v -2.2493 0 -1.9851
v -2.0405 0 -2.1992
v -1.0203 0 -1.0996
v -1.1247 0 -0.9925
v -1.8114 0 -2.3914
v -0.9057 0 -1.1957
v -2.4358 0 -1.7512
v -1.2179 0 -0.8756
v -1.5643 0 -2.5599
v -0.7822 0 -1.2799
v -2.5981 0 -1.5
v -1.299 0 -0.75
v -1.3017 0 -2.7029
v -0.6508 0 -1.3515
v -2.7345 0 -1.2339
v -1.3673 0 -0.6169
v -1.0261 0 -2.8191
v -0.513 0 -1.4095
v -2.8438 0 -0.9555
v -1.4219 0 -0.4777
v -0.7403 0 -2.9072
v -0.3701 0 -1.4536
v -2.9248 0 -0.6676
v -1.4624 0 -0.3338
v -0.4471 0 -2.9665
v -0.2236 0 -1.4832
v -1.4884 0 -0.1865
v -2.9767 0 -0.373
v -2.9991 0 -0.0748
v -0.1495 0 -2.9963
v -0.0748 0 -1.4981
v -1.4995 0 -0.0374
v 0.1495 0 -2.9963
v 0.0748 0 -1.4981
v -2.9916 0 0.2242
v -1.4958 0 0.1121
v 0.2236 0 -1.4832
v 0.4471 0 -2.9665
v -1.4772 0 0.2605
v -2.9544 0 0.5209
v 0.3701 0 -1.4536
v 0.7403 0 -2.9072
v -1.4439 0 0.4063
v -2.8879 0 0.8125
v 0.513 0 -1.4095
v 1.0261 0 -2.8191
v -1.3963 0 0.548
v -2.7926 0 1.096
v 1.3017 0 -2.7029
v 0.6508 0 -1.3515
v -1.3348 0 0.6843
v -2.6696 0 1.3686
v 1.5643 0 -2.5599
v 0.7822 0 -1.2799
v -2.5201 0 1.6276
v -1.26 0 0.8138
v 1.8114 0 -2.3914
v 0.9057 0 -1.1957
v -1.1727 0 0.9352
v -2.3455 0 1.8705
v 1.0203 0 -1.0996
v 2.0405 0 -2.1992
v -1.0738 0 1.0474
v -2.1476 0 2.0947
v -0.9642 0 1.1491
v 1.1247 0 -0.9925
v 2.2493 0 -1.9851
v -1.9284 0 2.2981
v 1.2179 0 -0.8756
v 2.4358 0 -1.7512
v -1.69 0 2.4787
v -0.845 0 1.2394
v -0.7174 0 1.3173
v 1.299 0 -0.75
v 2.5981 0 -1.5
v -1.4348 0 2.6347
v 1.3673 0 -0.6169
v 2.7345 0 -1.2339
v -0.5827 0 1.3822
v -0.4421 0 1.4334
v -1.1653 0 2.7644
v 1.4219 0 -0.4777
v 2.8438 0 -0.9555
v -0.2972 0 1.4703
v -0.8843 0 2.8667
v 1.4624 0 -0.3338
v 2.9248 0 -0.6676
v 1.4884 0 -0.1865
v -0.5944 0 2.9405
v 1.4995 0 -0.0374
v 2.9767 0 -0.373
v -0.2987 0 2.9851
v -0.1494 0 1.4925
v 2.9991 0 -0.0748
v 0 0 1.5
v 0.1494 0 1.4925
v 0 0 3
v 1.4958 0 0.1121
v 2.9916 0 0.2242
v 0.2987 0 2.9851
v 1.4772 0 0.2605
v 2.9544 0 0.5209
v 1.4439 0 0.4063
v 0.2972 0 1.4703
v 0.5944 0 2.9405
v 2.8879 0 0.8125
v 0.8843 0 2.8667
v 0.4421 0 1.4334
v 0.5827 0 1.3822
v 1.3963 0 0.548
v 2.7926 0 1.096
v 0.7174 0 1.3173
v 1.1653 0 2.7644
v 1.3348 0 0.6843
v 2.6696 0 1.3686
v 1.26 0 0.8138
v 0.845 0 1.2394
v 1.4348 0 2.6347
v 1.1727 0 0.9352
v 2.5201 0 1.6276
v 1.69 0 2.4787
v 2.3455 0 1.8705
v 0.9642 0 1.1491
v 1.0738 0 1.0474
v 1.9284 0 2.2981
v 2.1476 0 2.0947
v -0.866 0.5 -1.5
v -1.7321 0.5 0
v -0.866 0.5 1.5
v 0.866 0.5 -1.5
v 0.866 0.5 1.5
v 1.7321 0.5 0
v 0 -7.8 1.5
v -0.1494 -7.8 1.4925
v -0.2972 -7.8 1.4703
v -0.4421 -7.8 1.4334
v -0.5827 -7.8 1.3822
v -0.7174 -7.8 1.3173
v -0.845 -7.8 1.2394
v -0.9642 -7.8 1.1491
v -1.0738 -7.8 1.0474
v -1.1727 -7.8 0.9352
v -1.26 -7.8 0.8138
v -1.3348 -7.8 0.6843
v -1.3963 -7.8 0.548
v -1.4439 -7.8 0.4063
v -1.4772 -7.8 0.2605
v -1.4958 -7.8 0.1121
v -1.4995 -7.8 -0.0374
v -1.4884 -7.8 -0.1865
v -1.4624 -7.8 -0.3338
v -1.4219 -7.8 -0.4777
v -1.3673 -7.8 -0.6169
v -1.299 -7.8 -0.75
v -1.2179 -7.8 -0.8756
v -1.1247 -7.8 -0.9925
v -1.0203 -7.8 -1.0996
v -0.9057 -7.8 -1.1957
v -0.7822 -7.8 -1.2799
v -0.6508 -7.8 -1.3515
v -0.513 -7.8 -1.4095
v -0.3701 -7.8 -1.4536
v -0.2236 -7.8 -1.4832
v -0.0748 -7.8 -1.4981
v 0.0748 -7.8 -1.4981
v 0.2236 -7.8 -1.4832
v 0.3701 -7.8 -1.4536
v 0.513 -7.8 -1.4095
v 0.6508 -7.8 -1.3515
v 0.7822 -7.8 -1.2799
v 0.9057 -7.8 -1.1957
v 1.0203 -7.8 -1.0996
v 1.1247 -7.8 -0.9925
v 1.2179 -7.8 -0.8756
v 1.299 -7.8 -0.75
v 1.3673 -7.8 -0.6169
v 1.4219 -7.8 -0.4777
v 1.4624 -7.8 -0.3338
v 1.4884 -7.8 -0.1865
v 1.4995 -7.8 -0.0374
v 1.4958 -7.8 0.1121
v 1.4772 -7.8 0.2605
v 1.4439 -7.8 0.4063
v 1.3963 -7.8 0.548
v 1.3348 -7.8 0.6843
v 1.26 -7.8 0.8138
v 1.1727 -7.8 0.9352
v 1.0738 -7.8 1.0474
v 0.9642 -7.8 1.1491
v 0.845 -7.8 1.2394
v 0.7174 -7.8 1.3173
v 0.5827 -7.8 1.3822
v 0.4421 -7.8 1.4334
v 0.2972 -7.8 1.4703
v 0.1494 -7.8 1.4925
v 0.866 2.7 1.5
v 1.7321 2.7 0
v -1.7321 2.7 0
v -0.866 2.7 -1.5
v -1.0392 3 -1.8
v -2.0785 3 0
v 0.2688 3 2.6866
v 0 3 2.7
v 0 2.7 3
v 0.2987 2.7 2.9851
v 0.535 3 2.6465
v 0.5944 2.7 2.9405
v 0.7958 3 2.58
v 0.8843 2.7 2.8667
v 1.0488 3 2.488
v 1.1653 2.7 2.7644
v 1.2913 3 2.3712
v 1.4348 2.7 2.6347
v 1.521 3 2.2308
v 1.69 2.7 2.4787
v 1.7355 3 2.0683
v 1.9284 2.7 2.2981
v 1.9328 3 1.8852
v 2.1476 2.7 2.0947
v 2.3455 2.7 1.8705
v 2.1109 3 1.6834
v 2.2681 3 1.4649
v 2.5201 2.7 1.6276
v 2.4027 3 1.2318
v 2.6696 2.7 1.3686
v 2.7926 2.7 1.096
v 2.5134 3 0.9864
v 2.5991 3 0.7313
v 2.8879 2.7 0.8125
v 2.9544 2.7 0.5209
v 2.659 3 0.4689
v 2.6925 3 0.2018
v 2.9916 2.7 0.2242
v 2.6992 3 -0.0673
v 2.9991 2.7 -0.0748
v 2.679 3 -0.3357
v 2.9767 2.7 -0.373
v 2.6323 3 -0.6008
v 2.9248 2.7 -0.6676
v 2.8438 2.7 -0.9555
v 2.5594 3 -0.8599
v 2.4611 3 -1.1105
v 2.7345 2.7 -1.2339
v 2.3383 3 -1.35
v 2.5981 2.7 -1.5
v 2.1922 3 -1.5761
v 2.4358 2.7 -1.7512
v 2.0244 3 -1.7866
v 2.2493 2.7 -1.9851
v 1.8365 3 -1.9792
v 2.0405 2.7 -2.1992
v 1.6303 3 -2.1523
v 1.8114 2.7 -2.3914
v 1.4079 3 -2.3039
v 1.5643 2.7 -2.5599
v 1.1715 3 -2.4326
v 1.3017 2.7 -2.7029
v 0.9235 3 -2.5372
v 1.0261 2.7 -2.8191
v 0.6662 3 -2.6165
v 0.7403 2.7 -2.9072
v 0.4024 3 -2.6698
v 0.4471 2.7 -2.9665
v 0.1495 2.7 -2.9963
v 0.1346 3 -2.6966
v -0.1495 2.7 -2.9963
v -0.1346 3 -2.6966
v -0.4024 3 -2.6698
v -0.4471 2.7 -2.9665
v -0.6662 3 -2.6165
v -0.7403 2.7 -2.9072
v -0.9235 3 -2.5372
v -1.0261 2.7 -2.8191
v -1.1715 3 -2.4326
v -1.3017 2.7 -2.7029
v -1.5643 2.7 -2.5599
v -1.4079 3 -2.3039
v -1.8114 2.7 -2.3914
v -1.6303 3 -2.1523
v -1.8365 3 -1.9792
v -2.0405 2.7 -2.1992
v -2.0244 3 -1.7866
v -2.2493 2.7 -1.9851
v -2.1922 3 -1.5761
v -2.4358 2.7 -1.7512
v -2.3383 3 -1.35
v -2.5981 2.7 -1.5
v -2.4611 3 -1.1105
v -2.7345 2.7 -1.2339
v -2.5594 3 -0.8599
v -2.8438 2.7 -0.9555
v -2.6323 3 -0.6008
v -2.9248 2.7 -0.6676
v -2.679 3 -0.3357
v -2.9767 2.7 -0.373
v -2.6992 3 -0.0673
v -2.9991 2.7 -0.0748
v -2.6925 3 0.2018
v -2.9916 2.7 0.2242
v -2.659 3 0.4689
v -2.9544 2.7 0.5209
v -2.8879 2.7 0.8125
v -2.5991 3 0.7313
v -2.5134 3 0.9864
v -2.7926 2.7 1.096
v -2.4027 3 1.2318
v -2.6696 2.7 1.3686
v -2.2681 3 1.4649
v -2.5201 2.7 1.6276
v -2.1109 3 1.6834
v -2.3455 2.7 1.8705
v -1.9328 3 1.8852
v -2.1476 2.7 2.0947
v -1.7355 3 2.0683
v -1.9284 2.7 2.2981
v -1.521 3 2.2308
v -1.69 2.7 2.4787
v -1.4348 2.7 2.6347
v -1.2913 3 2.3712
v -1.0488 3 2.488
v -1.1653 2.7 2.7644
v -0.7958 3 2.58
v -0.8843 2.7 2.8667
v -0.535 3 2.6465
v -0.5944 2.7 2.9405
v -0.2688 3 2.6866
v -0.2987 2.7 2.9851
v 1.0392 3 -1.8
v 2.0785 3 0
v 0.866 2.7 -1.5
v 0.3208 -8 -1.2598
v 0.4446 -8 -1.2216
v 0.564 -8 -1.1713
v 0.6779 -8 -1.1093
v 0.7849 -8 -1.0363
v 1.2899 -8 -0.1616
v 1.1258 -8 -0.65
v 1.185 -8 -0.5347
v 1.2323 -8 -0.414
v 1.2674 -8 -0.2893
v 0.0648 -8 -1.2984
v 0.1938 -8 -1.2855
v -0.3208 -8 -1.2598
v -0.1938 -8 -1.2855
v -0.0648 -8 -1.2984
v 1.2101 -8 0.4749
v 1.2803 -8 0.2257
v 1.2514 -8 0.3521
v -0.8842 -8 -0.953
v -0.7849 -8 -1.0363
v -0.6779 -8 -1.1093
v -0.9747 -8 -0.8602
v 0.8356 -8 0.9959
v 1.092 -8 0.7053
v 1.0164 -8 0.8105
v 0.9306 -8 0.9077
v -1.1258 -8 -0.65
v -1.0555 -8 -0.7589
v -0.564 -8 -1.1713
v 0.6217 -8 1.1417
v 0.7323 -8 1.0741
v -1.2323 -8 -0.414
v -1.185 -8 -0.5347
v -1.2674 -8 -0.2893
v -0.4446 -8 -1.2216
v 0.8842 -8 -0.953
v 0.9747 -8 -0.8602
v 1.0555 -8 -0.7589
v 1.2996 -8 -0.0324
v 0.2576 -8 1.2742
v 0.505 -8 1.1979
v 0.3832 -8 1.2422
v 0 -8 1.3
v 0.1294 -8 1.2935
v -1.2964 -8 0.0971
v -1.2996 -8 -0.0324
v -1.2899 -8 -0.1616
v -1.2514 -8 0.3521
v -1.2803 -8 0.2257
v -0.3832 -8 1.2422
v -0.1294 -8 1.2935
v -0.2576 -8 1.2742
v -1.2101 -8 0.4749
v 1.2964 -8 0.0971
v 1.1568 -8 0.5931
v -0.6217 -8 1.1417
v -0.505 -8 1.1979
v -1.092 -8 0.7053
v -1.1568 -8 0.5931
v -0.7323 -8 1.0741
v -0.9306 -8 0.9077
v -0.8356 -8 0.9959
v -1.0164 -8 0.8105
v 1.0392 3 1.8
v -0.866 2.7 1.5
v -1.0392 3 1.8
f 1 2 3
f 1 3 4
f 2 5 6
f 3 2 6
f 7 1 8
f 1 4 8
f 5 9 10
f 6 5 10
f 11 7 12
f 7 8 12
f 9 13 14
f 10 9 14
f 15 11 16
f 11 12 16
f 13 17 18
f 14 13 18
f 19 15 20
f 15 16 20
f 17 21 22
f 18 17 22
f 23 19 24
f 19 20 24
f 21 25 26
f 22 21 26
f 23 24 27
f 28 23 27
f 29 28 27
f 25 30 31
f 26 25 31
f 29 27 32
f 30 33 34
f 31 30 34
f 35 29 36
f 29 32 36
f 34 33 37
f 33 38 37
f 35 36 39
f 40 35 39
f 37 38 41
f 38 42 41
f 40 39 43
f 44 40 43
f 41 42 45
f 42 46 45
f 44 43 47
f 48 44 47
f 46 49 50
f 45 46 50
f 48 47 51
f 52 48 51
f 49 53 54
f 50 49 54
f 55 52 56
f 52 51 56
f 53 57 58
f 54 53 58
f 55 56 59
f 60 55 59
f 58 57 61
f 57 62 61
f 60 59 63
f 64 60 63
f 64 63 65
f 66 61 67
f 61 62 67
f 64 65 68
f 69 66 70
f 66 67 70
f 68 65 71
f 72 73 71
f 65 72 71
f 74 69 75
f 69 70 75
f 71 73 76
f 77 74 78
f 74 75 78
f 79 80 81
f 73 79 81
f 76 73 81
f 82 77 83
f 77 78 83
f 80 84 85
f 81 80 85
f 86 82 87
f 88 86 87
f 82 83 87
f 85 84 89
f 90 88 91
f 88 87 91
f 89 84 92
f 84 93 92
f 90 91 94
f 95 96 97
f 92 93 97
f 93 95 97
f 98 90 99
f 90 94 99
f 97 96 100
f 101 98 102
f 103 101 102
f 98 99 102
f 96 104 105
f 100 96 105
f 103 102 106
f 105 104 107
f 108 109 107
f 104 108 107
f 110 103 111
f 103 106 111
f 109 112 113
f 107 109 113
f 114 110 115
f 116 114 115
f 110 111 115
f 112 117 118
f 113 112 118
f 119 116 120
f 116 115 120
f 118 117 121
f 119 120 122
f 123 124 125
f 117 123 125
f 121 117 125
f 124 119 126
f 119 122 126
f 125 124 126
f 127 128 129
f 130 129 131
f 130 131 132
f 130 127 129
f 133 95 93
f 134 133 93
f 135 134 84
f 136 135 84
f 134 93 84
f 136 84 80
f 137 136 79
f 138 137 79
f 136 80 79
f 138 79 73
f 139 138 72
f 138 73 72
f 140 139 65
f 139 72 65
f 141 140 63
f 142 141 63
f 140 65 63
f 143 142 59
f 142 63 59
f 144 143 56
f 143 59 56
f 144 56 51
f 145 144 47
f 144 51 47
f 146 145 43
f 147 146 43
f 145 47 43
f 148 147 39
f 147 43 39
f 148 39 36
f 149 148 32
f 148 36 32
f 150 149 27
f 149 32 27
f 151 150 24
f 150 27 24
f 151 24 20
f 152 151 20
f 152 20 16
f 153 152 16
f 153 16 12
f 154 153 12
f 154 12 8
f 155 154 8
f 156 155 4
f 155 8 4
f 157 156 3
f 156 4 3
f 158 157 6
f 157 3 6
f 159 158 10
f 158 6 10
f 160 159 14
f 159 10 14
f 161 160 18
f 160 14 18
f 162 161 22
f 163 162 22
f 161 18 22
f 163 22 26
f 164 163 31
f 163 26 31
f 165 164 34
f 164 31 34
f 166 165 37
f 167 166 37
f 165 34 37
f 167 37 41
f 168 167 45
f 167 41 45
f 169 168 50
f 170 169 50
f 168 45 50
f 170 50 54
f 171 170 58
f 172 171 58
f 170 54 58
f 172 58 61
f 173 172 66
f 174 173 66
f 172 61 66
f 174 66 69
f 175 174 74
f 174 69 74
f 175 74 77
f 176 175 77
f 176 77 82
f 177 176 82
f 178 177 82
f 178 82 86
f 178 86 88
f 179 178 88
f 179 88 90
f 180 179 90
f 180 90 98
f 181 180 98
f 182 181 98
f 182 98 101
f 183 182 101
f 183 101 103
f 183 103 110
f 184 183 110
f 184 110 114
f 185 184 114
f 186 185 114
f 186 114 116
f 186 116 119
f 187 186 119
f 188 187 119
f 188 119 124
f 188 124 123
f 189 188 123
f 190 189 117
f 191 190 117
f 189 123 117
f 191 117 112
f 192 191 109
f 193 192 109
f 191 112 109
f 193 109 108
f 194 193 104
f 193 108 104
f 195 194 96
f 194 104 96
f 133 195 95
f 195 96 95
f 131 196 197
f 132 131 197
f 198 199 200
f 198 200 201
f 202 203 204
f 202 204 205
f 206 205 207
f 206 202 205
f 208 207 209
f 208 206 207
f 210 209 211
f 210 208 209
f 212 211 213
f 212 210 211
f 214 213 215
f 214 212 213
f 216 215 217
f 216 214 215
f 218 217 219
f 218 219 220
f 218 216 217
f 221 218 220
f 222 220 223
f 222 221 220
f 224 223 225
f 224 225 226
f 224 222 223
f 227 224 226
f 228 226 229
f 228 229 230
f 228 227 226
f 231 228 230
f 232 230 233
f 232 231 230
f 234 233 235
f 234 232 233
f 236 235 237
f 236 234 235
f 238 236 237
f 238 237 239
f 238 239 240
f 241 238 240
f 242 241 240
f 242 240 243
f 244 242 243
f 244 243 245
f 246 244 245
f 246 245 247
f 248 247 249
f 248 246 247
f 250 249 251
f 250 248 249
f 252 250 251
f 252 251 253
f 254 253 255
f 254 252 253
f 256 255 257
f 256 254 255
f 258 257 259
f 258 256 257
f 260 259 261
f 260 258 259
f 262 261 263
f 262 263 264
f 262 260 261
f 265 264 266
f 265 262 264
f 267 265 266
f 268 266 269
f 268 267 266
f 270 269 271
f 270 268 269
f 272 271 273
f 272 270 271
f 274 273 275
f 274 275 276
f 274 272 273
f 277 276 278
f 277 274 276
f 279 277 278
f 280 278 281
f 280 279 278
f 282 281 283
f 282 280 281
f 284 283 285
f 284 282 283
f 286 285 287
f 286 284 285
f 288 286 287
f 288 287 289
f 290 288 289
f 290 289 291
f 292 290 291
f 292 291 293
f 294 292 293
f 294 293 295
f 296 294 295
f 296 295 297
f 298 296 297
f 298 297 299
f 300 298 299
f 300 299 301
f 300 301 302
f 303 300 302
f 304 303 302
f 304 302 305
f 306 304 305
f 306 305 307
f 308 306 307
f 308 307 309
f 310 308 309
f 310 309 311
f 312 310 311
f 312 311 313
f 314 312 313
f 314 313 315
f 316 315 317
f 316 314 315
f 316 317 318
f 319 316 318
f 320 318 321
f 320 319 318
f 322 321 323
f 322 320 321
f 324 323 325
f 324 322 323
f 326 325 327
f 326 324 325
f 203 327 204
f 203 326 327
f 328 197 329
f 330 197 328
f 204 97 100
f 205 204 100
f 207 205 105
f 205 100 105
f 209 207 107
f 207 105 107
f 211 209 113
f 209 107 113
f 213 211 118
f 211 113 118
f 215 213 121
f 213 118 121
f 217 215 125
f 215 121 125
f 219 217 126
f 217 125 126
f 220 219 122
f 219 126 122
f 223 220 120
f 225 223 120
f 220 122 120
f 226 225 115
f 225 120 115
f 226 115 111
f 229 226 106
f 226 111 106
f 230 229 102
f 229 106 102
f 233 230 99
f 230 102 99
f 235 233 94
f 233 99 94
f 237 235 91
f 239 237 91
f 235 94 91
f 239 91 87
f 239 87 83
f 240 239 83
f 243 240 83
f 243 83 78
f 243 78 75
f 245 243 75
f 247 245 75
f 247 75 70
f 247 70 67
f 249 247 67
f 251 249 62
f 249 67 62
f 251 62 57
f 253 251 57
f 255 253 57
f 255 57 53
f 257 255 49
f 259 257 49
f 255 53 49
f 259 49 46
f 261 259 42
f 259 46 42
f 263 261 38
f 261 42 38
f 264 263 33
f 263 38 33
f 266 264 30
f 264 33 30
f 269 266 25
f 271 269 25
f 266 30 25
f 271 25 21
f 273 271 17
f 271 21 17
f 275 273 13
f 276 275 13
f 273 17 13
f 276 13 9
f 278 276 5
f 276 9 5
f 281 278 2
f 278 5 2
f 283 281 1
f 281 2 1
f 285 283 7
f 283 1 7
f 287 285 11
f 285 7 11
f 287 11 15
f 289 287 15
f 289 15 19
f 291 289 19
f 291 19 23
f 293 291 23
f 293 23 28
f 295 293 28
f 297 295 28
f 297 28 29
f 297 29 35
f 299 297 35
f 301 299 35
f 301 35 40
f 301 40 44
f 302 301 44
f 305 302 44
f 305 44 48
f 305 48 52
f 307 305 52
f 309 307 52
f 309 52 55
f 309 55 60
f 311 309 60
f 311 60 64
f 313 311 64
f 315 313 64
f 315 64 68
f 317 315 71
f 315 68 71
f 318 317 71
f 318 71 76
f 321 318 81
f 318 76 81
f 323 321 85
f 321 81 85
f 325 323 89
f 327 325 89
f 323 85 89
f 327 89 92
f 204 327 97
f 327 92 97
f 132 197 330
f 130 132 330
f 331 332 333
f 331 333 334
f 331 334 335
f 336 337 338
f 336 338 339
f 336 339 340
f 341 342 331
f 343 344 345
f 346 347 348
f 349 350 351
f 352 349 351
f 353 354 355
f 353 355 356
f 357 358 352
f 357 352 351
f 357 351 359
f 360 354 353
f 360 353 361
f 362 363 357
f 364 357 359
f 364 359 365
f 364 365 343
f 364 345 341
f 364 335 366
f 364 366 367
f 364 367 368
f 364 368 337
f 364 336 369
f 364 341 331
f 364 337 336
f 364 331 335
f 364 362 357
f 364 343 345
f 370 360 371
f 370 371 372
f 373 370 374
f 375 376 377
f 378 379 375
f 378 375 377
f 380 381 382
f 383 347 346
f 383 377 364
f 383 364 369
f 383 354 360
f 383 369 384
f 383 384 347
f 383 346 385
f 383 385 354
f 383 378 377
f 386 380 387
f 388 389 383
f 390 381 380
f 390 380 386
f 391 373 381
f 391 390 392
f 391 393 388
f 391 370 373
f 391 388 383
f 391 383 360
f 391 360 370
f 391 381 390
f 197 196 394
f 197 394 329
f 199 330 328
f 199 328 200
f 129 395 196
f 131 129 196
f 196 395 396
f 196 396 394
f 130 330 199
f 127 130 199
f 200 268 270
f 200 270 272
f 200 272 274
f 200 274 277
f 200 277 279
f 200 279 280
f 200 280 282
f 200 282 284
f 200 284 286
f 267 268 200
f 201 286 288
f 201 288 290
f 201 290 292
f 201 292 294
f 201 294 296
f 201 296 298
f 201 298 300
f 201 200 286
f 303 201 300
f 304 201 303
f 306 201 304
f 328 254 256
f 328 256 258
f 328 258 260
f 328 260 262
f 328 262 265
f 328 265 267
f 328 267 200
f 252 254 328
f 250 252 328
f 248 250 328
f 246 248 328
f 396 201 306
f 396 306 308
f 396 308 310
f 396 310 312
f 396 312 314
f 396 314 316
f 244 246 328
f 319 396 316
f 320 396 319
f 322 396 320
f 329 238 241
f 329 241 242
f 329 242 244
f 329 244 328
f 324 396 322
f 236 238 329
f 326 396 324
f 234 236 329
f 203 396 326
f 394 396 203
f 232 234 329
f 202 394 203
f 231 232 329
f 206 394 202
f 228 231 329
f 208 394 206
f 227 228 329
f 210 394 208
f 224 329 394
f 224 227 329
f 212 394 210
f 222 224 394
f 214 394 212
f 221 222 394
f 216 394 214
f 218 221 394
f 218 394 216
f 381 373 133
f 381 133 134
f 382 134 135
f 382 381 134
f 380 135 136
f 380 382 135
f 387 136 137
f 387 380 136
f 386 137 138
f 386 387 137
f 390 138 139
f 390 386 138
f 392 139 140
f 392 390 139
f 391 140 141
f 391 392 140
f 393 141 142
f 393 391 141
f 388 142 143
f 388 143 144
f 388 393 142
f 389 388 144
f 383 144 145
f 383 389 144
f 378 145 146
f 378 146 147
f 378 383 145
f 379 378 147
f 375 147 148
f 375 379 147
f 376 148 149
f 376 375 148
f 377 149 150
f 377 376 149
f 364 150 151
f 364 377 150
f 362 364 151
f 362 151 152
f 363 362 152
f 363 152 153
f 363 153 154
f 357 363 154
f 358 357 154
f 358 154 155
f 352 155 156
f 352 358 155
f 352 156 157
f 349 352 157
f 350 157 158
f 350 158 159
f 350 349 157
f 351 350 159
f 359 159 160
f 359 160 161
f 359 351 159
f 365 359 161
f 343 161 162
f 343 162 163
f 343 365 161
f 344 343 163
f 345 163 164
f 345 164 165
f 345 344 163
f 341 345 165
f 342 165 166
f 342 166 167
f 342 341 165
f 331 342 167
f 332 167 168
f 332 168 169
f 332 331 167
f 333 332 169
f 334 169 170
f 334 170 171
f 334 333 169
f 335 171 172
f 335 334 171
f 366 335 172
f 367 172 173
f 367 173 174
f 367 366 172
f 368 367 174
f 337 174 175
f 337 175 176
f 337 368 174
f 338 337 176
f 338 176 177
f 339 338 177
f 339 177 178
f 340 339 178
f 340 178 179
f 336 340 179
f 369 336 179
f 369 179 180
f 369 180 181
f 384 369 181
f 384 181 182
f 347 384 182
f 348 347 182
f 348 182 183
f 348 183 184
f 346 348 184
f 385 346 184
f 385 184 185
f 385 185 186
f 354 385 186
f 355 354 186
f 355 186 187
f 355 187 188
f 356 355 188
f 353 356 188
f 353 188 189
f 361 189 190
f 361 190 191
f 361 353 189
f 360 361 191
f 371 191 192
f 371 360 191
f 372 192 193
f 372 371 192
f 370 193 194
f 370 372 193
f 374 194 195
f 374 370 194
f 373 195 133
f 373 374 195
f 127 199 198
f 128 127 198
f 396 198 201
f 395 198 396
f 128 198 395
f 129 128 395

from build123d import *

# Parameters (mm, degrees)
SKETCH1_R           = 3
BOSS_EXTRUDE1_DEPTH = 3
CHAMFER1_SIZE       = 0.3
CUT_EXTRUDE1_DEPTH  = 2.5
CHAMFER2_SIZE       = 0.3
SKETCH3_R           = 1.5
BOSS_EXTRUDE2_DEPTH = 8
CHAMFER3_SIZE       = 0.2


with BuildPart() as part:
    # Sketch1 → Boss-Extrude1 (new body)
    with BuildSketch(Plane(origin=(0, 0, 0), x_dir=(1, 0, 0), z_dir=(0, 1, 0))):
        with Locations(Location((0, 0, 0), (0, 0, 270))):  # turned: the seam where the file's is
            Circle(SKETCH1_R)
    extrude(amount=BOSS_EXTRUDE1_DEPTH)

    # Chamfer1
    chamfer1_edges = [part.edges().sort_by_distance(p)[0] for p in [
        (0, 3, -3),
    ]]
    chamfer(chamfer1_edges, length=CHAMFER1_SIZE)

    # Sketch2 → Cut-Extrude1 (cut)
    with BuildSketch(Plane(origin=(0, 3, 0), x_dir=(1, 0, 0), z_dir=(0, 1, 0))):
        Polygon((1.732050808, 0), (0.866025404, 1.5), (-0.866025404, 1.5), (-1.732050808, 0), (-0.866025404, -1.5), (0.866025404, -1.5), align=None)
    extrude(amount=-CUT_EXTRUDE1_DEPTH, mode=Mode.SUBTRACT)

    # Chamfer2
    chamfer2_edges = [part.edges().sort_by_distance(p)[0] for p in [
        (1.299038106, 3, 0.75),
        (1.299038106, 3, -0.75),
        (0, 3, -1.5),
        (-1.299038106, 3, -0.75),
        (-1.299038106, 3, 0.75),
        (0, 3, 1.5),
    ]]
    chamfer(chamfer2_edges, length=CHAMFER2_SIZE)

    # Sketch3 → Boss-Extrude2 (add)
    with BuildSketch(Plane.XZ):
        with Locations(Location((0, 0, 0), (0, 0, 90))):  # turned: the seam where the file's is
            Circle(SKETCH3_R)
    extrude(amount=BOSS_EXTRUDE2_DEPTH)

    # Chamfer3
    chamfer3_edges = [part.edges().sort_by_distance(p)[0] for p in [
        (0, -8, -1.5),
    ]]
    chamfer(chamfer3_edges, length=CHAMFER3_SIZE)


solid = part.part
